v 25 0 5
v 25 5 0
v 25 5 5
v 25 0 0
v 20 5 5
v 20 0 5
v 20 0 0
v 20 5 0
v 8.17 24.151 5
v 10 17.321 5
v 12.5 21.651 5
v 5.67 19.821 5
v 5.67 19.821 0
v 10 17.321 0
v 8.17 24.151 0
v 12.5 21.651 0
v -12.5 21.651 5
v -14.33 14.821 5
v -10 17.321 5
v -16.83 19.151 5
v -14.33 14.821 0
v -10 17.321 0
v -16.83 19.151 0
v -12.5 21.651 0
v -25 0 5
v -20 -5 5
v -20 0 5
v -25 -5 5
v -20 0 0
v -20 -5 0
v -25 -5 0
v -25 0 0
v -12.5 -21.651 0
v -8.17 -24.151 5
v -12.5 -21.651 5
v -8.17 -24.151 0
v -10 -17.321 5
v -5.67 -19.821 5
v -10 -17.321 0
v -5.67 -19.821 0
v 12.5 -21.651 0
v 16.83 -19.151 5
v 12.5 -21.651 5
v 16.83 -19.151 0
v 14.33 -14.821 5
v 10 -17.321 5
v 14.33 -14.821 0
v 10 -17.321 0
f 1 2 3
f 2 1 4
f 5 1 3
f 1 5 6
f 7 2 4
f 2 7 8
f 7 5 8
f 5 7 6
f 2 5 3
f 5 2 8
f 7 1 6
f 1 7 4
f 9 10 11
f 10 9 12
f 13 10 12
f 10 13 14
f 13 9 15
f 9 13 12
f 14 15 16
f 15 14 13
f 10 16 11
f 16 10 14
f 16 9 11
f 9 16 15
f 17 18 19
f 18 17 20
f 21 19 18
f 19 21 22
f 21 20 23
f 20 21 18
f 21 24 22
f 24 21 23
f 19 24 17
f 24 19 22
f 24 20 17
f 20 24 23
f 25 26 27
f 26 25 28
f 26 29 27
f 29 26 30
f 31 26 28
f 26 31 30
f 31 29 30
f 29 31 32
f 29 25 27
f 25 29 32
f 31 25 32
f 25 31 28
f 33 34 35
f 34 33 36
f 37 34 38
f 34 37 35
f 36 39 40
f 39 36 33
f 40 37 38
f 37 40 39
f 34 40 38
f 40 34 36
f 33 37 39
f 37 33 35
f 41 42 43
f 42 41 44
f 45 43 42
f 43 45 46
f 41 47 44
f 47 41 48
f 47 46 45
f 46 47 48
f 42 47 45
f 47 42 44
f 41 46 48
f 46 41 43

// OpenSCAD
for(i=[0:5]){
	rotate([0,0,i*60])translate([20,0,0]){cube([5,5,5]);}
}
